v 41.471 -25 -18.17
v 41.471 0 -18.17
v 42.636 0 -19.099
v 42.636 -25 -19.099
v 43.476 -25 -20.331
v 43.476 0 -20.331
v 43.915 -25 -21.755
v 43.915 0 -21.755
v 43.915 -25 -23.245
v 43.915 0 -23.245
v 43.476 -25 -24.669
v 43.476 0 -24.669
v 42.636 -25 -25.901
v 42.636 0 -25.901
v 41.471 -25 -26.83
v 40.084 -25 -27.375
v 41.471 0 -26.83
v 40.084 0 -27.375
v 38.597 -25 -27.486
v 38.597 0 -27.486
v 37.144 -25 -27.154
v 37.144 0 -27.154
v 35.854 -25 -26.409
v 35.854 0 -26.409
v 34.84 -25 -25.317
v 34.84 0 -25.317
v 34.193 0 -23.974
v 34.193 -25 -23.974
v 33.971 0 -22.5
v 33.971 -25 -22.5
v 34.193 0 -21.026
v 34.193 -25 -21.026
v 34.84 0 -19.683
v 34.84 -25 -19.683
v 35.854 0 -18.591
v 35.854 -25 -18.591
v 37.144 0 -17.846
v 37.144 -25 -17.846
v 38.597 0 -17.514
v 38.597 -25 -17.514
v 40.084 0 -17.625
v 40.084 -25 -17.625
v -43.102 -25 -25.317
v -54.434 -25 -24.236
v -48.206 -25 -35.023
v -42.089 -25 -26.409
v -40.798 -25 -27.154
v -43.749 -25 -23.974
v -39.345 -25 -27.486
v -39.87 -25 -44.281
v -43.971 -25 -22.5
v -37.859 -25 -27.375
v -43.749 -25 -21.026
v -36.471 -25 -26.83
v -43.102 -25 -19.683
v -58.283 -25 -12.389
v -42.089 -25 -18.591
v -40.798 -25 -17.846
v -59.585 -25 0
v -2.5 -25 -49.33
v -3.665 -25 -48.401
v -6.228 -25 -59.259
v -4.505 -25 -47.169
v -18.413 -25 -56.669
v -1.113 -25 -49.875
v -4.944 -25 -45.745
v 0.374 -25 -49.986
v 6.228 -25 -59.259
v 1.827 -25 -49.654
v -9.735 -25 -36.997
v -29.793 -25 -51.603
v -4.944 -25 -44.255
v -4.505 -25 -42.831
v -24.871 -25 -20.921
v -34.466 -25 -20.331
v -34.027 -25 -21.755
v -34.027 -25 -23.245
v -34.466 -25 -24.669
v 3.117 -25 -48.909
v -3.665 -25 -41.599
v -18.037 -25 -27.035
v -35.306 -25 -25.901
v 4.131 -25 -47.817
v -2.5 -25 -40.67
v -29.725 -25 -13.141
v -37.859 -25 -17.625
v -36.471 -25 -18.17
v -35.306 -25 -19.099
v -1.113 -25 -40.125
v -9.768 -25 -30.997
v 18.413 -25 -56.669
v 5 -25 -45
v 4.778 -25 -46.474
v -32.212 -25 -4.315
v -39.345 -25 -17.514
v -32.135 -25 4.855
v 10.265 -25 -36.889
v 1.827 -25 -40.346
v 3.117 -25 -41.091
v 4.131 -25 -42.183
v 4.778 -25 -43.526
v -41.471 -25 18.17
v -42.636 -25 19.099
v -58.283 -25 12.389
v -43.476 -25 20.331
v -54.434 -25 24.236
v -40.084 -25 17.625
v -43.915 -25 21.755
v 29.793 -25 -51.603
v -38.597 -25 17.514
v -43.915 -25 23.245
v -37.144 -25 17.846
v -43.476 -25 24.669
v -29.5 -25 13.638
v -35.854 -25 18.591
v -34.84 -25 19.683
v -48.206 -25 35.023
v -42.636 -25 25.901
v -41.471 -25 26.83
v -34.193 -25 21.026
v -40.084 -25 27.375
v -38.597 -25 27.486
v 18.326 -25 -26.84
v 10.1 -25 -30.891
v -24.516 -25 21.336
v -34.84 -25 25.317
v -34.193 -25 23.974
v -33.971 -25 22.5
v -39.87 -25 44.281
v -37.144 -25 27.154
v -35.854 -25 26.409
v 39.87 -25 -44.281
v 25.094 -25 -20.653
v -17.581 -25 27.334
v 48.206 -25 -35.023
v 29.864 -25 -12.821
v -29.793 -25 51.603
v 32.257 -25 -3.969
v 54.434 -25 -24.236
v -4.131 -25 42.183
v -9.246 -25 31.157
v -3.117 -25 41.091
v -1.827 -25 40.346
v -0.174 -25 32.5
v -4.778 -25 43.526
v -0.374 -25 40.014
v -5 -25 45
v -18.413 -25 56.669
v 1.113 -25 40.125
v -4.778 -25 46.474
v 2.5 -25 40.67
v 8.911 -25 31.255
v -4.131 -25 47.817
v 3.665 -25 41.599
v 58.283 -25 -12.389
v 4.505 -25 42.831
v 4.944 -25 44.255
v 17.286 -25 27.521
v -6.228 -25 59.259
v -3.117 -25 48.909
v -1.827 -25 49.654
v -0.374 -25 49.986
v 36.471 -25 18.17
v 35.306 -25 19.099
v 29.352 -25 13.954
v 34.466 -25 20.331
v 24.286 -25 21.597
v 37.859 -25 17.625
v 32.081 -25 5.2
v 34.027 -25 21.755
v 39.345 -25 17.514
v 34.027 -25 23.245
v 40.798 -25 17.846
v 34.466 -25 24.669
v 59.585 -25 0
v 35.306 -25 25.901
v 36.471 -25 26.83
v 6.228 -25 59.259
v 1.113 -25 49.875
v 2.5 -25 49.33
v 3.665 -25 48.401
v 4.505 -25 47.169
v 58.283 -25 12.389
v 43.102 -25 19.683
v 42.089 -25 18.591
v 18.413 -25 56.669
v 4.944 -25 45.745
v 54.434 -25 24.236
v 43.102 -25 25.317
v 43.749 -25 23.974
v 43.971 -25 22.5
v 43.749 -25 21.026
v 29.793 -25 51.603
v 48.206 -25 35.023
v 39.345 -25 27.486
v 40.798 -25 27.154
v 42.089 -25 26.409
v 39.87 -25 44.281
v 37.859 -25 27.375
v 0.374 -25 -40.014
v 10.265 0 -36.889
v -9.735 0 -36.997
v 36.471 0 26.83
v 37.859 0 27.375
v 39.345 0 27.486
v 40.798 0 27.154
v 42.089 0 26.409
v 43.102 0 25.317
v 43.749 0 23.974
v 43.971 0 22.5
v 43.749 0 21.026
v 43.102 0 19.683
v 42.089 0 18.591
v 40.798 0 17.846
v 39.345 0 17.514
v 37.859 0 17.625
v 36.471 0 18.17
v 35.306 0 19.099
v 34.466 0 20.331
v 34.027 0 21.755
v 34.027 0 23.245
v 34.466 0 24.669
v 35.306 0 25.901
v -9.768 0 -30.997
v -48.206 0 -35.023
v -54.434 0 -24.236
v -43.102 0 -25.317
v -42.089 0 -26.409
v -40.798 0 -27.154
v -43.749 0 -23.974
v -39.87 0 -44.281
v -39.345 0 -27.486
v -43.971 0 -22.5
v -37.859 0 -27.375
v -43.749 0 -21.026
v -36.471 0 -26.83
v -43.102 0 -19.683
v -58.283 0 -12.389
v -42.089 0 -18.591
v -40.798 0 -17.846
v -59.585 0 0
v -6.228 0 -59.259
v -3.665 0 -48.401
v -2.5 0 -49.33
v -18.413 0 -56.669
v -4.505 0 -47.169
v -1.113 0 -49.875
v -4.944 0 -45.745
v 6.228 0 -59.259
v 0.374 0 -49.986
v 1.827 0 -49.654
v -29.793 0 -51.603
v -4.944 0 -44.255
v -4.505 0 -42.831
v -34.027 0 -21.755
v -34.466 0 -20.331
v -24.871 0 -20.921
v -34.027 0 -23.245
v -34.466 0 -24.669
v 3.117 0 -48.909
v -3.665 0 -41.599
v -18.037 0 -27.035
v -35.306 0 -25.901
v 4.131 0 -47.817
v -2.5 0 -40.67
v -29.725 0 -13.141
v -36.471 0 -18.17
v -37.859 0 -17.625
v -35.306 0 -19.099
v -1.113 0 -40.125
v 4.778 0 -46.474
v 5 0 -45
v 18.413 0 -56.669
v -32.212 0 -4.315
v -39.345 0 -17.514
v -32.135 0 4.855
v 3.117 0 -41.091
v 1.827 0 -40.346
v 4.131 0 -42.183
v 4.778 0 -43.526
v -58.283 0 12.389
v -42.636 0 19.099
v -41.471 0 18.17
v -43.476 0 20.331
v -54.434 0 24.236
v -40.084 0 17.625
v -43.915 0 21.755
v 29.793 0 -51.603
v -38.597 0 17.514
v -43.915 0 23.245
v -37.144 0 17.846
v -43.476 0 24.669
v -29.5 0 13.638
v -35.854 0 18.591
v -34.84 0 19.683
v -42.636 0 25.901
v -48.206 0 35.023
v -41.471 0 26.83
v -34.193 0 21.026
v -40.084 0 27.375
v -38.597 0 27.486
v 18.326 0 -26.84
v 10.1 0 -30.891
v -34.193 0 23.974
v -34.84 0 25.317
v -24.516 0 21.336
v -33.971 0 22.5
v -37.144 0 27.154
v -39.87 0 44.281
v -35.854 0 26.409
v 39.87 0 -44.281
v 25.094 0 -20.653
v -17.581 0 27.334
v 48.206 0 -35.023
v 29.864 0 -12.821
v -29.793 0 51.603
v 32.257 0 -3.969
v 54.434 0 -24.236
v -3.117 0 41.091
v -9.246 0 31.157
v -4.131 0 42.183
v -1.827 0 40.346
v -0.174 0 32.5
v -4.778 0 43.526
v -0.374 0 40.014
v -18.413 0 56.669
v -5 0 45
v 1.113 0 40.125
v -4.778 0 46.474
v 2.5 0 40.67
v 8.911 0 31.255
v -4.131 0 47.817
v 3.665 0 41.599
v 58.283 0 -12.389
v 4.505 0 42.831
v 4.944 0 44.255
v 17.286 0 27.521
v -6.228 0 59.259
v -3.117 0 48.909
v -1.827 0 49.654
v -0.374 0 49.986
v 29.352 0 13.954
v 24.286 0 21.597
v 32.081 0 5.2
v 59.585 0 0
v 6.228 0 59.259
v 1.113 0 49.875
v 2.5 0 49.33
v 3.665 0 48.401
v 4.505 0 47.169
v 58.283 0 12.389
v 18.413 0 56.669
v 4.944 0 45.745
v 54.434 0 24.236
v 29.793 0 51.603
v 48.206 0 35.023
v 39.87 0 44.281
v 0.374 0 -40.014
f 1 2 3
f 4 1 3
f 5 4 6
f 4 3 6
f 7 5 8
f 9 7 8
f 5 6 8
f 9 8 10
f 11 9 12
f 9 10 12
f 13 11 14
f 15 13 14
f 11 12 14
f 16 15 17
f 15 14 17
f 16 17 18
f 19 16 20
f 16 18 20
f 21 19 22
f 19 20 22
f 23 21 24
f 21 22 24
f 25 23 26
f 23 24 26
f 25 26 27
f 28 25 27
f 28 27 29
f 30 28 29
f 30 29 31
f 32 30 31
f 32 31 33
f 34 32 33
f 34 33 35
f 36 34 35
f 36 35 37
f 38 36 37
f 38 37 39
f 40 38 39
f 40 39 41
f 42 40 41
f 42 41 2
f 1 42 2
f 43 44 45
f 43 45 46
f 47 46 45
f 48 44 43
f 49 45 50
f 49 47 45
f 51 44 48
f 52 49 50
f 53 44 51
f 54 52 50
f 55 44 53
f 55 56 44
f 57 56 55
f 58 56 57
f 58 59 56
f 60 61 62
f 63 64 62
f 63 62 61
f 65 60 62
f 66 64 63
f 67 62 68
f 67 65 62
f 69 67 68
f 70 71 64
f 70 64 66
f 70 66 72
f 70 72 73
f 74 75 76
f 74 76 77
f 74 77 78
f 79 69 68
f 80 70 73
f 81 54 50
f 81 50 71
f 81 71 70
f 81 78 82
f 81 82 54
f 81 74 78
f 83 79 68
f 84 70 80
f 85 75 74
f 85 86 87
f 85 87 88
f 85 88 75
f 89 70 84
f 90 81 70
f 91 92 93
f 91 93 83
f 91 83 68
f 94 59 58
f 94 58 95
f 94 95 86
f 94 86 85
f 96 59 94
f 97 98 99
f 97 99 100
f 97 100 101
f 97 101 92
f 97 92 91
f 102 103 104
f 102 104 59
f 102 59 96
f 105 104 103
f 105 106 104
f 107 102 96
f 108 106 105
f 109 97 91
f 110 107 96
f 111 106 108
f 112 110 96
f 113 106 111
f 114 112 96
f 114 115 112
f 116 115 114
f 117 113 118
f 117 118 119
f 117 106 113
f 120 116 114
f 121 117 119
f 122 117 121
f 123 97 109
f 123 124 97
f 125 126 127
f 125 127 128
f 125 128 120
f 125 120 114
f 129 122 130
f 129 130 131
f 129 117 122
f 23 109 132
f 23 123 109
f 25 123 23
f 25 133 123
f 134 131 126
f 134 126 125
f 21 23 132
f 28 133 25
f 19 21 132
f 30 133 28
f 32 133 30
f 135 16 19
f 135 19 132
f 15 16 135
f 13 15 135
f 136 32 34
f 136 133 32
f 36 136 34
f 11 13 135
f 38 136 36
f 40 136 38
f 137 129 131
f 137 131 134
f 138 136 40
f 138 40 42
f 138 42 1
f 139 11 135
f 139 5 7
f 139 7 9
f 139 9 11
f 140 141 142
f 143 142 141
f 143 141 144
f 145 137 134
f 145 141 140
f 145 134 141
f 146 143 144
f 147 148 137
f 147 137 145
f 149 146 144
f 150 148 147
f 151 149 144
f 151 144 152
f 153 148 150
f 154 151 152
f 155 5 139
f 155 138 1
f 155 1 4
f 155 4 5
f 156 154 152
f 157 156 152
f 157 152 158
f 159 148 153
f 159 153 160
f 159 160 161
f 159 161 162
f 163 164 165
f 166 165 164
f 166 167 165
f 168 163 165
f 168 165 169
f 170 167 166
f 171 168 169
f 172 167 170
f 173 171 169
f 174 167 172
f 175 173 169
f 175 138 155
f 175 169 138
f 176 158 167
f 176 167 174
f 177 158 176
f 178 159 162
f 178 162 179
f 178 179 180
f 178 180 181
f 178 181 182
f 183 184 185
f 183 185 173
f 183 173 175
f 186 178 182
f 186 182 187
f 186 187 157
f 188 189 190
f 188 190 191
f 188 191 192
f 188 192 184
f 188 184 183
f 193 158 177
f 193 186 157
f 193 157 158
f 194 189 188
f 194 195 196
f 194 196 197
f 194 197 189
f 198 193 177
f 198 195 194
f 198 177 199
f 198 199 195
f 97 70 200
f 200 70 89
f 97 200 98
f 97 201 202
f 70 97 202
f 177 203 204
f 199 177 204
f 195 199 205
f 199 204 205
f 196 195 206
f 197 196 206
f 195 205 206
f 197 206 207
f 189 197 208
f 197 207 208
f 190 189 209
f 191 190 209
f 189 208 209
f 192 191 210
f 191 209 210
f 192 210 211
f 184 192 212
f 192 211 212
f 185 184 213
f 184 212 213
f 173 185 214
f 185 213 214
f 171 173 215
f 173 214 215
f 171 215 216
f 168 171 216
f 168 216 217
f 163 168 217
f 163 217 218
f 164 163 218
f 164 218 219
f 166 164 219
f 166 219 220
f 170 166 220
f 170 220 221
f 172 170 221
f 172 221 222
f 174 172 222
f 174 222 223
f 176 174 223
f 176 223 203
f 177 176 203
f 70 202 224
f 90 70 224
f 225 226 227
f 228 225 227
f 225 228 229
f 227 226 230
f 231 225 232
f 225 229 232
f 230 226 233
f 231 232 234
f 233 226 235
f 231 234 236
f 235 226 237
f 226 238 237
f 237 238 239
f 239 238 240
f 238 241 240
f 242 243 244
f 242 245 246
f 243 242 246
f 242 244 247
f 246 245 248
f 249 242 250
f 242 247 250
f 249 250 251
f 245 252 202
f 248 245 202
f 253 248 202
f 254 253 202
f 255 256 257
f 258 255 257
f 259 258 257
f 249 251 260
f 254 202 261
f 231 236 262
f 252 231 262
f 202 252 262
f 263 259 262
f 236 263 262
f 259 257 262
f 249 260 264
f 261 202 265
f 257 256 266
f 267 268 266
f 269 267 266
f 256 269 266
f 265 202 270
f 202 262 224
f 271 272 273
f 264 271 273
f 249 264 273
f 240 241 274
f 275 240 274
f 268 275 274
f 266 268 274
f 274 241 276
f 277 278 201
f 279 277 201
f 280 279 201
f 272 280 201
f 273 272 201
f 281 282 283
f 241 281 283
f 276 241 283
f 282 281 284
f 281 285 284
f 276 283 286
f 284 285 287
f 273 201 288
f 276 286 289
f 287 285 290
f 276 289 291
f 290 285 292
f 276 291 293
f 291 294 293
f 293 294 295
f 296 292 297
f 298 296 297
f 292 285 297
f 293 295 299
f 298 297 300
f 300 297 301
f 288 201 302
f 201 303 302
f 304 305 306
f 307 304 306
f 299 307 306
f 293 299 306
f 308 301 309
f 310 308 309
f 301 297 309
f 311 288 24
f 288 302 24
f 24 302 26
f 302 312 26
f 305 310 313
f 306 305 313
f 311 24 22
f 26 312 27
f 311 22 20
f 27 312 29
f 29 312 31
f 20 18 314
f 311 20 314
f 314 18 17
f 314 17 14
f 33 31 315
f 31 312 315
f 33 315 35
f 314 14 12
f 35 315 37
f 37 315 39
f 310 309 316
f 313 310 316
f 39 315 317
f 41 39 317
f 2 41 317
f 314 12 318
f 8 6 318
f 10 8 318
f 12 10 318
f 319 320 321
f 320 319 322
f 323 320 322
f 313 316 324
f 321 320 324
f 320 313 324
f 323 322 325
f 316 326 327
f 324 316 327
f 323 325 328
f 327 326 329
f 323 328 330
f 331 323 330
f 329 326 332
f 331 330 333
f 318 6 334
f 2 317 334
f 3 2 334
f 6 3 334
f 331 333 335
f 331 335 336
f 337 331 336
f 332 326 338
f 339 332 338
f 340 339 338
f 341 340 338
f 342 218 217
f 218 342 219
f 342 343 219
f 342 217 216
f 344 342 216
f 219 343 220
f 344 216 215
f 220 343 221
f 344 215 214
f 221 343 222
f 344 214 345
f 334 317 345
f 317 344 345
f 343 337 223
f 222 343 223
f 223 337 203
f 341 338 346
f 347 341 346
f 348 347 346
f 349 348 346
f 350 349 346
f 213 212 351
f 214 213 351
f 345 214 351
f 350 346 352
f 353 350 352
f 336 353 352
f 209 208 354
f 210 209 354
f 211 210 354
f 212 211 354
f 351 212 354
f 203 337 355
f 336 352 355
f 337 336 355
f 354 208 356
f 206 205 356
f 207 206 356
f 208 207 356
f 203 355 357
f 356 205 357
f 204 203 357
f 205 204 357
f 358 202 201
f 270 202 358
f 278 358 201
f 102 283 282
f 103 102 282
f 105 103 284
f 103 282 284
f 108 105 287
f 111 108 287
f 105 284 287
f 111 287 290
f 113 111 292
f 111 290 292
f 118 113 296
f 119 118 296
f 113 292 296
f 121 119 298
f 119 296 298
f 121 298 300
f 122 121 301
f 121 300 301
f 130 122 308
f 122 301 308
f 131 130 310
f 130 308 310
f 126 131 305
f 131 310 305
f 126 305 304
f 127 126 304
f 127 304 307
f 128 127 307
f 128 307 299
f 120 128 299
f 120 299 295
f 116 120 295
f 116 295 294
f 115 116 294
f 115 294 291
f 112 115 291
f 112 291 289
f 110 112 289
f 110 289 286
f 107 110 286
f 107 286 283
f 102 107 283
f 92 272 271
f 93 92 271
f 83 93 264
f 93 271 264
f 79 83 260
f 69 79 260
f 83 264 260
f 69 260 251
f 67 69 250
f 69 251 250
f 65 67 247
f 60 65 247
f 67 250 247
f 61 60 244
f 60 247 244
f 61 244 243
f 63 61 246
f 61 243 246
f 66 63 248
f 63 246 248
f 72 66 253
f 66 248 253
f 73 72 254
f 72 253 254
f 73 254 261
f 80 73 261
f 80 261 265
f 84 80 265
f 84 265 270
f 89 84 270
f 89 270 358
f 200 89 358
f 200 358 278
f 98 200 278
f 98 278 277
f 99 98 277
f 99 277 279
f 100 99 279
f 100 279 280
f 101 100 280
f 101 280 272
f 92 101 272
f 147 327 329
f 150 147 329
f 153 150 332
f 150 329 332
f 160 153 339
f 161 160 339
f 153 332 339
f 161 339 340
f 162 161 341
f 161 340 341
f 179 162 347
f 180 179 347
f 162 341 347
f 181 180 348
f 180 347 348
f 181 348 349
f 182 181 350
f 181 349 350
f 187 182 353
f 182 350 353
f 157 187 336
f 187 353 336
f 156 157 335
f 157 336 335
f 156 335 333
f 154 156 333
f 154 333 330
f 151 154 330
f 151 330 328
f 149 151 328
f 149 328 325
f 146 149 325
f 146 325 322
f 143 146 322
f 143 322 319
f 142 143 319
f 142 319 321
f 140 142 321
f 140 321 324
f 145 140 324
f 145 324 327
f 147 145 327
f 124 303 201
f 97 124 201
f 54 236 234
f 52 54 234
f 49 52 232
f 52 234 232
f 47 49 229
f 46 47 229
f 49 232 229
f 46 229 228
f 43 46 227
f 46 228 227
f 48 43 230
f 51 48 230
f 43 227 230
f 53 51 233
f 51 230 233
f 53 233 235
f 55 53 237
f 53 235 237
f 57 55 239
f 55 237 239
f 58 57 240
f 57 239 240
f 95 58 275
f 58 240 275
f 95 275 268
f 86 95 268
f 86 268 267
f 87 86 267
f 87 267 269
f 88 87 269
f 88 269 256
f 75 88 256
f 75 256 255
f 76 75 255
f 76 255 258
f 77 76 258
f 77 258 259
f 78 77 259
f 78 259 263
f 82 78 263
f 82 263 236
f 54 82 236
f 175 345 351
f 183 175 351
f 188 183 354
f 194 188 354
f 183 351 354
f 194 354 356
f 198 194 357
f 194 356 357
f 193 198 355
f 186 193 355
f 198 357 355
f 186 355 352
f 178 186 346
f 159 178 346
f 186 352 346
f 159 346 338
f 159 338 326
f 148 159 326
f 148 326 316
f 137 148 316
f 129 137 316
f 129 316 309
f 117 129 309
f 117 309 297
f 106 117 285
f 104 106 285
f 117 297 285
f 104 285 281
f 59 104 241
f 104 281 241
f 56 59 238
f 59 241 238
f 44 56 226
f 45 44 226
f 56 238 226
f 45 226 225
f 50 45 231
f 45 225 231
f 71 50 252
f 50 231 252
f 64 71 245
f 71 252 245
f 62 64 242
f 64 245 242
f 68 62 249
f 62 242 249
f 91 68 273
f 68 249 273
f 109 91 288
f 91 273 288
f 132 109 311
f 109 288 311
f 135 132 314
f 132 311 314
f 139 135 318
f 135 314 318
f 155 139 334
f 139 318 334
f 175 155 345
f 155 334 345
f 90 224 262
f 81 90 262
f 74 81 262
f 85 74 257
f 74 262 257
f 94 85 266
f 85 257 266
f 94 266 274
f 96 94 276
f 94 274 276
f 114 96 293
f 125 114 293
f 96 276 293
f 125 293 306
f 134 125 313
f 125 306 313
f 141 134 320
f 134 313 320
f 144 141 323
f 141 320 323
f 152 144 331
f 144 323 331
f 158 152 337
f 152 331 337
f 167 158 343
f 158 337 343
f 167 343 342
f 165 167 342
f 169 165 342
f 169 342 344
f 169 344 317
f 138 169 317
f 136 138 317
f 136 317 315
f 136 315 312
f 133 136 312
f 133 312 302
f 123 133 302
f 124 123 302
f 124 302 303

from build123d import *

# Parameters (mm, degrees)
F0_R            = 59.5854737817
F0_R_2          = 5
F1_DEPTH        = 25
F3_D            = 10
F3_DEPTH        = 35
F3_TIP          = 3.0043030951
F3_COPIES_COUNT = 6


# Not quite as in the source:
# - a pattern or mirror of a feature is missing from the dataset's text; its kind, count and spacing are read off the source's solid


with BuildPart() as f1:
    # F0 (on Front) → F1 (new body)
    with BuildSketch(Plane.XZ):
        Circle(F0_R)
        with BuildLine():
            Line((-9.7349431967, -36.997402159), (-9.7675768508, -30.9974909059))
            ThreePointArc((-9.7675768508, -30.9974909059), (-0.1743718668, 32.499532219), (10.099630663, -30.8908960775))
            Line((10.099630663, -30.8908960775), (10.2647609802, -36.8886233119))
            Line((10.2647609802, -36.8886233119), (-9.7349431967, -36.997402159))
        make_face(mode=Mode.SUBTRACT)
        with Locations((0, 45)):
            Circle(F0_R_2, mode=Mode.SUBTRACT)
        with Locations((0, 45)):
            Circle(F0_R_2)
    extrude(amount=F1_DEPTH)

    # F3
    with Locations(Plane.XZ.offset(25)):
        with Locations((0, 45)):
            f3 = Hole(F3_D / 2, depth=F3_DEPTH)
            with Locations((0, 0, -(F3_DEPTH + F3_TIP / 2))):  # 118° drill point
                Cone(0, F3_D / 2, F3_TIP, mode=Mode.SUBTRACT)

    # F3_copies: F3 ×6 about axis
    f3_copies_axis = Axis((0, 0, 0), (0, 1, 0))
    for i in range(1, F3_COPIES_COUNT):
        add(f3.rotate(f3_copies_axis, i * 360 / F3_COPIES_COUNT), mode=Mode.SUBTRACT)


solid = f1.part
